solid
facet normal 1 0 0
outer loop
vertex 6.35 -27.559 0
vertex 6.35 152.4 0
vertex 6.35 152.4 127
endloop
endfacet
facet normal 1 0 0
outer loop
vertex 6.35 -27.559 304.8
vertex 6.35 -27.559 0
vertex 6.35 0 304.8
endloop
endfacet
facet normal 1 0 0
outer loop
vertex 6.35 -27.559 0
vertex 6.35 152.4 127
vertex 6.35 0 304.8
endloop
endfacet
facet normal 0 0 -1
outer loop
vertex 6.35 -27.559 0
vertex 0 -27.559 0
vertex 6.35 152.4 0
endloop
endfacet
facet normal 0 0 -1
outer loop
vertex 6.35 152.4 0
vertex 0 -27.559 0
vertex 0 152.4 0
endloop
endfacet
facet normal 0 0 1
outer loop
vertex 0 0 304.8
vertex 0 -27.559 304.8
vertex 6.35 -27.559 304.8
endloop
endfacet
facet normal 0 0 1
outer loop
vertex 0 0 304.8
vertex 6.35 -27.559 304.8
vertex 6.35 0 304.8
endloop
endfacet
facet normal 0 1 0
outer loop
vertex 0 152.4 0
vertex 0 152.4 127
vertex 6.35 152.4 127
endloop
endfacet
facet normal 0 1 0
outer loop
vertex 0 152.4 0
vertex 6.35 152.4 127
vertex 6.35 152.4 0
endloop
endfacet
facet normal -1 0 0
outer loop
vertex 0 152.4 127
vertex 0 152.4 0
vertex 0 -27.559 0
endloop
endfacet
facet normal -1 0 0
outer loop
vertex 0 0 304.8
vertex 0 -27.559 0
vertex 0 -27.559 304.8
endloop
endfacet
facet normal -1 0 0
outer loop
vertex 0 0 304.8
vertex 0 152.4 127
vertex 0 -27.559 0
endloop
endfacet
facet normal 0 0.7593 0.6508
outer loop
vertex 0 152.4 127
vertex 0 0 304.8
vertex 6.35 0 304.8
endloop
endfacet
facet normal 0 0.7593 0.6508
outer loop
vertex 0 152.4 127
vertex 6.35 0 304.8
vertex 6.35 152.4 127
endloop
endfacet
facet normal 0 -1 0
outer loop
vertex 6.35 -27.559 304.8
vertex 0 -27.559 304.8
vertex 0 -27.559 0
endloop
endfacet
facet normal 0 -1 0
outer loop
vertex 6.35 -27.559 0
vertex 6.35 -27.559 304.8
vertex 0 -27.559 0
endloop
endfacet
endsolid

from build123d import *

# Parameters (mm, degrees)
ESQUISSE2_W        = 304.8
ESQUISSE2_H        = 27.559
BOSS_EXTRU_1_DEPTH = 6.35


with BuildPart() as part:
    # Esquisse2 → Boss.-Extru.1 (new body)
    with BuildSketch(Plane(origin=(0, 0, 0), x_dir=(0, 0, -1), z_dir=(1, 0, 0))):
        Polygon((0, 152.4), (0, 0), (-304.8, 0), (-127, 152.4), align=None)
        with Locations((-152.4, -13.7795)):
            Rectangle(ESQUISSE2_W, ESQUISSE2_H)
    extrude(amount=BOSS_EXTRU_1_DEPTH)


solid = part.part
